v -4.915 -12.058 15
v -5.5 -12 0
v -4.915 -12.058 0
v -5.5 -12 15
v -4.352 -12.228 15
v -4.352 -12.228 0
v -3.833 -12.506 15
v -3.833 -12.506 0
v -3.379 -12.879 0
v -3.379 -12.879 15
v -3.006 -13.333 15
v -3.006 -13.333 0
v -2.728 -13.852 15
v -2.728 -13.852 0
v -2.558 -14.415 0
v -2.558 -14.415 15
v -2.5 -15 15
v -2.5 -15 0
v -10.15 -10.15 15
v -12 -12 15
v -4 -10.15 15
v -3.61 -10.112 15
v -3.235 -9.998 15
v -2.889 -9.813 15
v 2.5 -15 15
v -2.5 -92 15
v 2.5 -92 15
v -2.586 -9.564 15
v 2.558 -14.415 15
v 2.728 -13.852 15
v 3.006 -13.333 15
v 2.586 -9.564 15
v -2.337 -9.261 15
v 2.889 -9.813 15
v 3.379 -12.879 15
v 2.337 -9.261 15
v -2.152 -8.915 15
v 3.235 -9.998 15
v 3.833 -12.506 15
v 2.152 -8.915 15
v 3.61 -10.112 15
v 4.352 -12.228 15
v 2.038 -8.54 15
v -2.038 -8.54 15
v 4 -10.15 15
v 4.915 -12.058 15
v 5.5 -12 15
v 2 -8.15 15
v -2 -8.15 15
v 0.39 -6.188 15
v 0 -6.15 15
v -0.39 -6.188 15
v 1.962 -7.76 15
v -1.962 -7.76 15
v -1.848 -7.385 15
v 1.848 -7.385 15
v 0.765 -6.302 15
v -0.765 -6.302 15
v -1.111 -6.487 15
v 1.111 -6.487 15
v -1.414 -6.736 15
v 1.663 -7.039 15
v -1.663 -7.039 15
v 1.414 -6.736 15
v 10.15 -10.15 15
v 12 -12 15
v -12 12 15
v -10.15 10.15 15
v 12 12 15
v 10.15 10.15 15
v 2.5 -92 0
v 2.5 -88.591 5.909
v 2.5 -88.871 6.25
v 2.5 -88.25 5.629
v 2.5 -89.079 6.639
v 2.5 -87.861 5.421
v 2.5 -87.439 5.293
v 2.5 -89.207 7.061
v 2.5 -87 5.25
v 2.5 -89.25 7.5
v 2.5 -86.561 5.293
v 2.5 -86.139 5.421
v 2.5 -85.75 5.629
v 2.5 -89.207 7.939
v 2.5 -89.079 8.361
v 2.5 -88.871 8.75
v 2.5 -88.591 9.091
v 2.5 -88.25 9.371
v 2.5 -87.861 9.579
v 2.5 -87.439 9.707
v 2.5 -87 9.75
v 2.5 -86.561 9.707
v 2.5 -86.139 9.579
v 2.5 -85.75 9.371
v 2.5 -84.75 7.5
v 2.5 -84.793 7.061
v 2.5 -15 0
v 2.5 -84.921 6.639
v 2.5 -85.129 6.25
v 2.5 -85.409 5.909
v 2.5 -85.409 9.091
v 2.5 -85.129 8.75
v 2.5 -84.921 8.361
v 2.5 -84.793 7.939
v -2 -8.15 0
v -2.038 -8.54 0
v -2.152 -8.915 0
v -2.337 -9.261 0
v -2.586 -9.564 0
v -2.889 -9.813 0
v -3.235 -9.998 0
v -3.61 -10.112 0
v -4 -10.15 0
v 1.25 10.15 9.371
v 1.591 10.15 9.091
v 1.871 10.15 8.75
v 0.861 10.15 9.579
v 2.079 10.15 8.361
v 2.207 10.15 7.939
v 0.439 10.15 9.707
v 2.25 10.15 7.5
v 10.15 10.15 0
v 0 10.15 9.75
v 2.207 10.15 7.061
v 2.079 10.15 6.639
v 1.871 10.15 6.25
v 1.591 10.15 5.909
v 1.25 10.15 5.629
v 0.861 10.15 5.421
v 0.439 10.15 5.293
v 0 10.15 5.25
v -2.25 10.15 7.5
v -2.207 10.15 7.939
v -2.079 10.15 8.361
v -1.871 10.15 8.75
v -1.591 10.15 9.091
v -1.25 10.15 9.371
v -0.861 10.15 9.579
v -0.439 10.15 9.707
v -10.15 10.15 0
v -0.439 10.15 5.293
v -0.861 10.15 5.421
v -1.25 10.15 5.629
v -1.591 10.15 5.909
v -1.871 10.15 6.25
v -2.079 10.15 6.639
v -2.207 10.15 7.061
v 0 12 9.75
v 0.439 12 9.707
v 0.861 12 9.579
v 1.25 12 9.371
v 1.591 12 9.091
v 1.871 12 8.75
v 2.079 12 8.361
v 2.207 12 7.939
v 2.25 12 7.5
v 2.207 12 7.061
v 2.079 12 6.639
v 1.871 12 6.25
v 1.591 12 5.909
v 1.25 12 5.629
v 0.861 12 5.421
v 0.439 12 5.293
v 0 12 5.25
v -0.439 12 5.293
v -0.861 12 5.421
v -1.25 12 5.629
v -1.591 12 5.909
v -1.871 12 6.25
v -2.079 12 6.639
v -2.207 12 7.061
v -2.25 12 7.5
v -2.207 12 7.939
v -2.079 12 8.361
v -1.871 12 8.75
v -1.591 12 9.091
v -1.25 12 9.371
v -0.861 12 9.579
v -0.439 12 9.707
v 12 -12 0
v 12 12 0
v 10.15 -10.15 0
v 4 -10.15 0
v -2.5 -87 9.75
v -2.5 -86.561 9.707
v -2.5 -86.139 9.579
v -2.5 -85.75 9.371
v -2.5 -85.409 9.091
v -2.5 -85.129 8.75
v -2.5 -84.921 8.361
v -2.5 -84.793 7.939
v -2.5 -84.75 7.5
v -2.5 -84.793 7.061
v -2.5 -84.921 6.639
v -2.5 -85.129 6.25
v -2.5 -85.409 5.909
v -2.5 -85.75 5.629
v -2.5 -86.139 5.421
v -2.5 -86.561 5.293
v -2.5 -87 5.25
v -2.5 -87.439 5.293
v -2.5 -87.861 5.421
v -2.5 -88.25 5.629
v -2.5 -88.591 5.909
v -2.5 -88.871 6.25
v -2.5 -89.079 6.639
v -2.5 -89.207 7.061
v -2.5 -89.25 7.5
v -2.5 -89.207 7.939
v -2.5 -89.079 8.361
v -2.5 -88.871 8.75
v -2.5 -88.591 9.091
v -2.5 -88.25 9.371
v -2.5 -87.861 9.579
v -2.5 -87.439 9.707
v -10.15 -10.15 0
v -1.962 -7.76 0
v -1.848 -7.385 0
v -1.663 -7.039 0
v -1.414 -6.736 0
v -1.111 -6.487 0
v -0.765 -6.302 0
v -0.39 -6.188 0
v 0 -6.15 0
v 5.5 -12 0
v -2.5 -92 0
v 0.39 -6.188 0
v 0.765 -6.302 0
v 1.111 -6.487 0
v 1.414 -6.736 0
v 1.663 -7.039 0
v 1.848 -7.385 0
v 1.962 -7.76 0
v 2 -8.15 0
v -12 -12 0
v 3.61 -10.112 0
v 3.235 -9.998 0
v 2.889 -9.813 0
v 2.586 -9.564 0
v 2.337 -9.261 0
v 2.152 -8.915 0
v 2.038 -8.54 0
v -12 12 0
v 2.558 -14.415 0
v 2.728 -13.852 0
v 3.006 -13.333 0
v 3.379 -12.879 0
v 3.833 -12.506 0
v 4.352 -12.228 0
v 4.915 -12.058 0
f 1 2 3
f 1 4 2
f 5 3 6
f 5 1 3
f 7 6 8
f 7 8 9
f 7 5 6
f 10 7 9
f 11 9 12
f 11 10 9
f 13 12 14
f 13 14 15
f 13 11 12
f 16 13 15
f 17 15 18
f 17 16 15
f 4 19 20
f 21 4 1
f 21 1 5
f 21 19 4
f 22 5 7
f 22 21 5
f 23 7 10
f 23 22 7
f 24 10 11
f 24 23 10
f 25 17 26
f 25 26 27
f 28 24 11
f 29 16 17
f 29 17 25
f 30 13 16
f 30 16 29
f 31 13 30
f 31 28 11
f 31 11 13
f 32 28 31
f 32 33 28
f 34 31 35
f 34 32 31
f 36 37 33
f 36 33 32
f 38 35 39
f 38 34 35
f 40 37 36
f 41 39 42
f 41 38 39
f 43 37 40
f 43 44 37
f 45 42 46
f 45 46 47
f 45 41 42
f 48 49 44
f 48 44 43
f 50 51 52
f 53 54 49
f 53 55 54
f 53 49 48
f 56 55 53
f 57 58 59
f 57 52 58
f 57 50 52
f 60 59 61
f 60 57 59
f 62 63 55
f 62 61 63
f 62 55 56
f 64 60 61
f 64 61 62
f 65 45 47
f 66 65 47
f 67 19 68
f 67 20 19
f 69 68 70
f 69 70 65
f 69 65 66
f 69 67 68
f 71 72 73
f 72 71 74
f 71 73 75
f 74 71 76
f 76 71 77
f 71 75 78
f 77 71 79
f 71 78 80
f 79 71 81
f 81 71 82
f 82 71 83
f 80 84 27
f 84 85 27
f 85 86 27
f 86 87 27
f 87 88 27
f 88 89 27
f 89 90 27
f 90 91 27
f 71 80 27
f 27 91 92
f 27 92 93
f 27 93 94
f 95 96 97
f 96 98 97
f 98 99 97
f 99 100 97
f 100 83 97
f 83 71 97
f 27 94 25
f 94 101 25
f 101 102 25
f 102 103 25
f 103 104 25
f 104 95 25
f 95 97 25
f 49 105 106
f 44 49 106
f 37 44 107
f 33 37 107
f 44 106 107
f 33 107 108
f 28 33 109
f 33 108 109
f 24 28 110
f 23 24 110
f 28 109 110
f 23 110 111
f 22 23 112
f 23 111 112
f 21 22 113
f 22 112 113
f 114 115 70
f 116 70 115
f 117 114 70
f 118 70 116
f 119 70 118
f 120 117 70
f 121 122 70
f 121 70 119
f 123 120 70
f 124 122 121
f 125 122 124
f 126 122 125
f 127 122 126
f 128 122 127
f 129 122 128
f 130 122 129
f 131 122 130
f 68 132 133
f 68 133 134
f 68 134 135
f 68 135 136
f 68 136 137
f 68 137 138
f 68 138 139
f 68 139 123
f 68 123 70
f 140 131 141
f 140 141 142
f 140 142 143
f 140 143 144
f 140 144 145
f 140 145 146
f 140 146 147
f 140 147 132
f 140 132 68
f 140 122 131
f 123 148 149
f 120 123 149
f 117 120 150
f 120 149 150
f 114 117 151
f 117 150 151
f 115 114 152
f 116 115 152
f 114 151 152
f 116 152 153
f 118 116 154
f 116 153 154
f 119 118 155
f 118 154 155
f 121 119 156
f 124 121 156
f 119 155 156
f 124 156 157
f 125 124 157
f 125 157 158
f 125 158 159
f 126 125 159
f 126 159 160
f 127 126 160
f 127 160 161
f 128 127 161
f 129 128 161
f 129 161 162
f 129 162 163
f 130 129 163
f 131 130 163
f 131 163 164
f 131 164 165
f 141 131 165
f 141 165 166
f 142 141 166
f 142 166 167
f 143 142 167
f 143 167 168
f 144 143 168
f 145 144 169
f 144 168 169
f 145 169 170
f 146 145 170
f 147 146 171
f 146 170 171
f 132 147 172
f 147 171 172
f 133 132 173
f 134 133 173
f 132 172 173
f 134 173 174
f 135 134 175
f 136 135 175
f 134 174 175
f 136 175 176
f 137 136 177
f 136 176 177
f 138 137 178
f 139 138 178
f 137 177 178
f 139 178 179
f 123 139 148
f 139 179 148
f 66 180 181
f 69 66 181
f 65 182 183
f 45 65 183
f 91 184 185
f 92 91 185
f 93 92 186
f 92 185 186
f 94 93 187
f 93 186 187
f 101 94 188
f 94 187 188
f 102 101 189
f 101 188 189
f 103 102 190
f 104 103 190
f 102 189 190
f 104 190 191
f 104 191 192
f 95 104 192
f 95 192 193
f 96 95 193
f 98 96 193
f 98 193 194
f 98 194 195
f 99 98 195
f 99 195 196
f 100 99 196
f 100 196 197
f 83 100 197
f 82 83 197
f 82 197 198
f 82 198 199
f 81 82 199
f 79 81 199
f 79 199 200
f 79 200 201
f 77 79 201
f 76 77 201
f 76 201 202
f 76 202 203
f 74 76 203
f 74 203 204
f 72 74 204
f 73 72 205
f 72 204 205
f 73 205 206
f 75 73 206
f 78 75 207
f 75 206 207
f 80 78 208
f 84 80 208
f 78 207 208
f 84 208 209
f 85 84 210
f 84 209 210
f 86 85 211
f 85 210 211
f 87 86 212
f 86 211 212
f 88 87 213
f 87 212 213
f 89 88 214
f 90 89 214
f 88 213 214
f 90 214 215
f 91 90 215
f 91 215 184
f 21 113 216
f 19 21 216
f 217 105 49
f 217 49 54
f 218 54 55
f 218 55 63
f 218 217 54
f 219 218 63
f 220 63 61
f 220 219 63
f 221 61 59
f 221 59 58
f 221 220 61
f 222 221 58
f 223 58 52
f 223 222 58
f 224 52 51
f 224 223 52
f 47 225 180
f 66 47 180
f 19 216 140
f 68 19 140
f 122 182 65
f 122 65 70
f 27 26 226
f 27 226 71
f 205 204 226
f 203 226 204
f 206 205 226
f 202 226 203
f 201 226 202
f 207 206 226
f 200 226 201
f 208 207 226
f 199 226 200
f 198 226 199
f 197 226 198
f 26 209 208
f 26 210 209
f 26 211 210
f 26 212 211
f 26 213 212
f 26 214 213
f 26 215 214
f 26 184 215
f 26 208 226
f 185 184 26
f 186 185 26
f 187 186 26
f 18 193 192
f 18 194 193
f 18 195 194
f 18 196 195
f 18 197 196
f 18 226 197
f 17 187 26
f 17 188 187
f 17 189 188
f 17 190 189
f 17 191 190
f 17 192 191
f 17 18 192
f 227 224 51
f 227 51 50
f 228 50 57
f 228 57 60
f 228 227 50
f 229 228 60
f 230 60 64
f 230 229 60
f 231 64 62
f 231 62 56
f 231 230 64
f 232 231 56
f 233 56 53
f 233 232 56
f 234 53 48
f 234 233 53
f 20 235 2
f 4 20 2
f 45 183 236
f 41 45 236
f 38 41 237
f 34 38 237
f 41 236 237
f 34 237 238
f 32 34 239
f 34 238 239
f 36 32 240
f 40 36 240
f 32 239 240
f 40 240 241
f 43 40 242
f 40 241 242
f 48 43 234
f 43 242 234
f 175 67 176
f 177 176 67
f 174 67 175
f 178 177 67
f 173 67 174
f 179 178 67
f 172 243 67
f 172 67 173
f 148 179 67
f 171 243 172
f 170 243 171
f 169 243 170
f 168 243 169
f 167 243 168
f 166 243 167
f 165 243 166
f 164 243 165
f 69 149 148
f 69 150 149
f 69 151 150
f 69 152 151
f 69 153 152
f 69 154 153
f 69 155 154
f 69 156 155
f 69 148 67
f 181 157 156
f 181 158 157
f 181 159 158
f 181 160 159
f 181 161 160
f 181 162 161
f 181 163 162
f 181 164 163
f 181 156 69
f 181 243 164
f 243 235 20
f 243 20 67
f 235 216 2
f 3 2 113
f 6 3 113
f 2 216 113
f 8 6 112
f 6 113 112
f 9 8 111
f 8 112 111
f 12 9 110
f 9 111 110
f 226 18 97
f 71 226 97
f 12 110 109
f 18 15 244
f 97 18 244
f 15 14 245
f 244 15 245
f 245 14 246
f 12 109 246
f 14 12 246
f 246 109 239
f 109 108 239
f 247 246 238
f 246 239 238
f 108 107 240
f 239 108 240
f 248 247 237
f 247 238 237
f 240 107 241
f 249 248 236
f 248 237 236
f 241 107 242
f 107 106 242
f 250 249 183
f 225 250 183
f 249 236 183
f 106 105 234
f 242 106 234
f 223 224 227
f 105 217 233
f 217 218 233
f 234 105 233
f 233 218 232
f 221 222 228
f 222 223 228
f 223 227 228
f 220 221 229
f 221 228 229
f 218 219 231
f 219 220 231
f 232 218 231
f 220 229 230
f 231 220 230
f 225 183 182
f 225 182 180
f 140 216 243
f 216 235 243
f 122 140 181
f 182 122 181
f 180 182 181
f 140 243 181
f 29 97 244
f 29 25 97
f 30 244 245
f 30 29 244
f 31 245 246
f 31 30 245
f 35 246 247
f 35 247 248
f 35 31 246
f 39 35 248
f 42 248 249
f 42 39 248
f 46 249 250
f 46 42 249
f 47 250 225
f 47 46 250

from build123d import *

# Parameters (mm, degrees)
CROQUIS1_W              = 24
CROQUIS1_H              = 24
SALIENTE_EXTRUIR1_DEPTH = 15
CROQUIS2_W              = 20.3
CROQUIS2_H              = 20.3
CORTAR_EXTRUIR1_DEPTH   = 20
CORTAR_EXTRUIR2_REACH   = 32.741
CROQUIS3_R              = 2.25
CROQUIS4_W              = 5
CROQUIS4_H              = 15
SALIENTE_EXTRUIR2_DEPTH = 80
CROQUIS5_W              = 4
CROQUIS5_H              = 4
SALIENTE_EXTRUIR3_DEPTH = 15
REDONDEO1_START         = -1
REDONDEO1_DEPTH         = 17
REDONDEO1_2_DEPTH       = 15
CORTAR_EXTRUIR5_REACH   = 96.336
CROQUIS6_R              = 2.25
REDONDEO3_R             = 3


with BuildPart() as part:
    # Croquis1 → Saliente-Extruir1 (new body)
    with BuildSketch(Plane.XY):
        Rectangle(CROQUIS1_W, CROQUIS1_H)
    extrude(amount=SALIENTE_EXTRUIR1_DEPTH)

    # Croquis2 → Cortar-Extruir1 (cut)
    with BuildSketch(Plane(origin=(0, 0, 0), x_dir=(-1, 0, 0), z_dir=(0, 0, -1))):
        Rectangle(CROQUIS2_W, CROQUIS2_H)
    extrude(amount=-CORTAR_EXTRUIR1_DEPTH, mode=Mode.SUBTRACT)

    # Croquis3 → Cortar-Extruir2 (cut, up to next)
    with BuildSketch(Plane(origin=(0, 12, 0), x_dir=(1, 0, 0), z_dir=(0, 1, 0)), mode=Mode.PRIVATE) as cortar_extruir2_sk1:
        with Locations(Location((0, -7.5, 0), (0, 0, 270))):
            Circle(CROQUIS3_R)
    cortar_extruir2_tool1 = extrude(cortar_extruir2_sk1.sketch, amount=-CORTAR_EXTRUIR2_REACH, mode=Mode.PRIVATE) & part.part
    add(cortar_extruir2_tool1.solids().sort_by_distance((0, 12, 7.5))[0], mode=Mode.SUBTRACT)

    # Croquis4 → Saliente-Extruir2 (add)
    with BuildSketch(Plane.XZ.offset(12)):
        with Locations((0, 7.5)):
            Rectangle(CROQUIS4_W, CROQUIS4_H)
    extrude(amount=SALIENTE_EXTRUIR2_DEPTH)

    # Croquis5 → Saliente-Extruir3 (add)
    with BuildSketch(Plane.XY.offset(15)):
        with Locations((0, -8.15)):
            Rectangle(CROQUIS5_W, CROQUIS5_H)
    extrude(amount=-SALIENTE_EXTRUIR3_DEPTH)

    # Redondeo1: read off the stored shape, not the designer's step
    # Redondeo1 outline → Redondeo1 (cut)
    with BuildSketch(Plane.XY.offset(REDONDEO1_START)):
        with BuildLine():
            ThreePointArc((-2, -8.15), (-1.414213562, -6.735786438), (0, -6.15))
            Line((0, -6.15), (-2, -6.15))
            Line((-2, -6.15), (-2, -8.15))
        make_face()
        with BuildLine():
            ThreePointArc((0, -6.15), (1.414213562, -6.735786438), (2, -8.15))
            Line((2, -8.15), (2, -6.15))
            Line((2, -6.15), (0, -6.15))
        make_face()
    extrude(amount=REDONDEO1_DEPTH, mode=Mode.SUBTRACT)

    # Redondeo1 2 outline → Redondeo1 2 (add)
    with BuildSketch(Plane.XY):
        with BuildLine():
            Line((-2, -10.15), (-2, -8.15))
            ThreePointArc((-2, -8.15), (-2.585786438, -9.564213562), (-4, -10.15))
            Line((-4, -10.15), (-2, -10.15))
        make_face()
        with BuildLine():
            ThreePointArc((4, -10.15), (2.585786438, -9.564213562), (2, -8.15))
            Line((2, -8.15), (2, -10.15))
            Line((2, -10.15), (4, -10.15))
        make_face()
    extrude(amount=REDONDEO1_2_DEPTH)

    # Croquis6 → Cortar-Extruir5 (cut, up to next)
    with BuildSketch(Plane.ZY.offset(2.5), mode=Mode.PRIVATE) as cortar_extruir5_sk1:
        with Locations((7.5, -87)):
            Circle(CROQUIS6_R)
    cortar_extruir5_tool1 = extrude(cortar_extruir5_sk1.sketch, amount=-CORTAR_EXTRUIR5_REACH, mode=Mode.PRIVATE) & part.part
    add(cortar_extruir5_tool1.solids().sort_by_distance((-2.5, -87, 7.5))[0], mode=Mode.SUBTRACT)

    # Redondeo3
    redondeo3_edges = [part.edges().sort_by_distance(p)[0] for p in [
        (-2.5, -12, 7.5),
        (2.5, -12, 7.5),
    ]]
    fillet(redondeo3_edges, radius=REDONDEO3_R)


solid = part.part
